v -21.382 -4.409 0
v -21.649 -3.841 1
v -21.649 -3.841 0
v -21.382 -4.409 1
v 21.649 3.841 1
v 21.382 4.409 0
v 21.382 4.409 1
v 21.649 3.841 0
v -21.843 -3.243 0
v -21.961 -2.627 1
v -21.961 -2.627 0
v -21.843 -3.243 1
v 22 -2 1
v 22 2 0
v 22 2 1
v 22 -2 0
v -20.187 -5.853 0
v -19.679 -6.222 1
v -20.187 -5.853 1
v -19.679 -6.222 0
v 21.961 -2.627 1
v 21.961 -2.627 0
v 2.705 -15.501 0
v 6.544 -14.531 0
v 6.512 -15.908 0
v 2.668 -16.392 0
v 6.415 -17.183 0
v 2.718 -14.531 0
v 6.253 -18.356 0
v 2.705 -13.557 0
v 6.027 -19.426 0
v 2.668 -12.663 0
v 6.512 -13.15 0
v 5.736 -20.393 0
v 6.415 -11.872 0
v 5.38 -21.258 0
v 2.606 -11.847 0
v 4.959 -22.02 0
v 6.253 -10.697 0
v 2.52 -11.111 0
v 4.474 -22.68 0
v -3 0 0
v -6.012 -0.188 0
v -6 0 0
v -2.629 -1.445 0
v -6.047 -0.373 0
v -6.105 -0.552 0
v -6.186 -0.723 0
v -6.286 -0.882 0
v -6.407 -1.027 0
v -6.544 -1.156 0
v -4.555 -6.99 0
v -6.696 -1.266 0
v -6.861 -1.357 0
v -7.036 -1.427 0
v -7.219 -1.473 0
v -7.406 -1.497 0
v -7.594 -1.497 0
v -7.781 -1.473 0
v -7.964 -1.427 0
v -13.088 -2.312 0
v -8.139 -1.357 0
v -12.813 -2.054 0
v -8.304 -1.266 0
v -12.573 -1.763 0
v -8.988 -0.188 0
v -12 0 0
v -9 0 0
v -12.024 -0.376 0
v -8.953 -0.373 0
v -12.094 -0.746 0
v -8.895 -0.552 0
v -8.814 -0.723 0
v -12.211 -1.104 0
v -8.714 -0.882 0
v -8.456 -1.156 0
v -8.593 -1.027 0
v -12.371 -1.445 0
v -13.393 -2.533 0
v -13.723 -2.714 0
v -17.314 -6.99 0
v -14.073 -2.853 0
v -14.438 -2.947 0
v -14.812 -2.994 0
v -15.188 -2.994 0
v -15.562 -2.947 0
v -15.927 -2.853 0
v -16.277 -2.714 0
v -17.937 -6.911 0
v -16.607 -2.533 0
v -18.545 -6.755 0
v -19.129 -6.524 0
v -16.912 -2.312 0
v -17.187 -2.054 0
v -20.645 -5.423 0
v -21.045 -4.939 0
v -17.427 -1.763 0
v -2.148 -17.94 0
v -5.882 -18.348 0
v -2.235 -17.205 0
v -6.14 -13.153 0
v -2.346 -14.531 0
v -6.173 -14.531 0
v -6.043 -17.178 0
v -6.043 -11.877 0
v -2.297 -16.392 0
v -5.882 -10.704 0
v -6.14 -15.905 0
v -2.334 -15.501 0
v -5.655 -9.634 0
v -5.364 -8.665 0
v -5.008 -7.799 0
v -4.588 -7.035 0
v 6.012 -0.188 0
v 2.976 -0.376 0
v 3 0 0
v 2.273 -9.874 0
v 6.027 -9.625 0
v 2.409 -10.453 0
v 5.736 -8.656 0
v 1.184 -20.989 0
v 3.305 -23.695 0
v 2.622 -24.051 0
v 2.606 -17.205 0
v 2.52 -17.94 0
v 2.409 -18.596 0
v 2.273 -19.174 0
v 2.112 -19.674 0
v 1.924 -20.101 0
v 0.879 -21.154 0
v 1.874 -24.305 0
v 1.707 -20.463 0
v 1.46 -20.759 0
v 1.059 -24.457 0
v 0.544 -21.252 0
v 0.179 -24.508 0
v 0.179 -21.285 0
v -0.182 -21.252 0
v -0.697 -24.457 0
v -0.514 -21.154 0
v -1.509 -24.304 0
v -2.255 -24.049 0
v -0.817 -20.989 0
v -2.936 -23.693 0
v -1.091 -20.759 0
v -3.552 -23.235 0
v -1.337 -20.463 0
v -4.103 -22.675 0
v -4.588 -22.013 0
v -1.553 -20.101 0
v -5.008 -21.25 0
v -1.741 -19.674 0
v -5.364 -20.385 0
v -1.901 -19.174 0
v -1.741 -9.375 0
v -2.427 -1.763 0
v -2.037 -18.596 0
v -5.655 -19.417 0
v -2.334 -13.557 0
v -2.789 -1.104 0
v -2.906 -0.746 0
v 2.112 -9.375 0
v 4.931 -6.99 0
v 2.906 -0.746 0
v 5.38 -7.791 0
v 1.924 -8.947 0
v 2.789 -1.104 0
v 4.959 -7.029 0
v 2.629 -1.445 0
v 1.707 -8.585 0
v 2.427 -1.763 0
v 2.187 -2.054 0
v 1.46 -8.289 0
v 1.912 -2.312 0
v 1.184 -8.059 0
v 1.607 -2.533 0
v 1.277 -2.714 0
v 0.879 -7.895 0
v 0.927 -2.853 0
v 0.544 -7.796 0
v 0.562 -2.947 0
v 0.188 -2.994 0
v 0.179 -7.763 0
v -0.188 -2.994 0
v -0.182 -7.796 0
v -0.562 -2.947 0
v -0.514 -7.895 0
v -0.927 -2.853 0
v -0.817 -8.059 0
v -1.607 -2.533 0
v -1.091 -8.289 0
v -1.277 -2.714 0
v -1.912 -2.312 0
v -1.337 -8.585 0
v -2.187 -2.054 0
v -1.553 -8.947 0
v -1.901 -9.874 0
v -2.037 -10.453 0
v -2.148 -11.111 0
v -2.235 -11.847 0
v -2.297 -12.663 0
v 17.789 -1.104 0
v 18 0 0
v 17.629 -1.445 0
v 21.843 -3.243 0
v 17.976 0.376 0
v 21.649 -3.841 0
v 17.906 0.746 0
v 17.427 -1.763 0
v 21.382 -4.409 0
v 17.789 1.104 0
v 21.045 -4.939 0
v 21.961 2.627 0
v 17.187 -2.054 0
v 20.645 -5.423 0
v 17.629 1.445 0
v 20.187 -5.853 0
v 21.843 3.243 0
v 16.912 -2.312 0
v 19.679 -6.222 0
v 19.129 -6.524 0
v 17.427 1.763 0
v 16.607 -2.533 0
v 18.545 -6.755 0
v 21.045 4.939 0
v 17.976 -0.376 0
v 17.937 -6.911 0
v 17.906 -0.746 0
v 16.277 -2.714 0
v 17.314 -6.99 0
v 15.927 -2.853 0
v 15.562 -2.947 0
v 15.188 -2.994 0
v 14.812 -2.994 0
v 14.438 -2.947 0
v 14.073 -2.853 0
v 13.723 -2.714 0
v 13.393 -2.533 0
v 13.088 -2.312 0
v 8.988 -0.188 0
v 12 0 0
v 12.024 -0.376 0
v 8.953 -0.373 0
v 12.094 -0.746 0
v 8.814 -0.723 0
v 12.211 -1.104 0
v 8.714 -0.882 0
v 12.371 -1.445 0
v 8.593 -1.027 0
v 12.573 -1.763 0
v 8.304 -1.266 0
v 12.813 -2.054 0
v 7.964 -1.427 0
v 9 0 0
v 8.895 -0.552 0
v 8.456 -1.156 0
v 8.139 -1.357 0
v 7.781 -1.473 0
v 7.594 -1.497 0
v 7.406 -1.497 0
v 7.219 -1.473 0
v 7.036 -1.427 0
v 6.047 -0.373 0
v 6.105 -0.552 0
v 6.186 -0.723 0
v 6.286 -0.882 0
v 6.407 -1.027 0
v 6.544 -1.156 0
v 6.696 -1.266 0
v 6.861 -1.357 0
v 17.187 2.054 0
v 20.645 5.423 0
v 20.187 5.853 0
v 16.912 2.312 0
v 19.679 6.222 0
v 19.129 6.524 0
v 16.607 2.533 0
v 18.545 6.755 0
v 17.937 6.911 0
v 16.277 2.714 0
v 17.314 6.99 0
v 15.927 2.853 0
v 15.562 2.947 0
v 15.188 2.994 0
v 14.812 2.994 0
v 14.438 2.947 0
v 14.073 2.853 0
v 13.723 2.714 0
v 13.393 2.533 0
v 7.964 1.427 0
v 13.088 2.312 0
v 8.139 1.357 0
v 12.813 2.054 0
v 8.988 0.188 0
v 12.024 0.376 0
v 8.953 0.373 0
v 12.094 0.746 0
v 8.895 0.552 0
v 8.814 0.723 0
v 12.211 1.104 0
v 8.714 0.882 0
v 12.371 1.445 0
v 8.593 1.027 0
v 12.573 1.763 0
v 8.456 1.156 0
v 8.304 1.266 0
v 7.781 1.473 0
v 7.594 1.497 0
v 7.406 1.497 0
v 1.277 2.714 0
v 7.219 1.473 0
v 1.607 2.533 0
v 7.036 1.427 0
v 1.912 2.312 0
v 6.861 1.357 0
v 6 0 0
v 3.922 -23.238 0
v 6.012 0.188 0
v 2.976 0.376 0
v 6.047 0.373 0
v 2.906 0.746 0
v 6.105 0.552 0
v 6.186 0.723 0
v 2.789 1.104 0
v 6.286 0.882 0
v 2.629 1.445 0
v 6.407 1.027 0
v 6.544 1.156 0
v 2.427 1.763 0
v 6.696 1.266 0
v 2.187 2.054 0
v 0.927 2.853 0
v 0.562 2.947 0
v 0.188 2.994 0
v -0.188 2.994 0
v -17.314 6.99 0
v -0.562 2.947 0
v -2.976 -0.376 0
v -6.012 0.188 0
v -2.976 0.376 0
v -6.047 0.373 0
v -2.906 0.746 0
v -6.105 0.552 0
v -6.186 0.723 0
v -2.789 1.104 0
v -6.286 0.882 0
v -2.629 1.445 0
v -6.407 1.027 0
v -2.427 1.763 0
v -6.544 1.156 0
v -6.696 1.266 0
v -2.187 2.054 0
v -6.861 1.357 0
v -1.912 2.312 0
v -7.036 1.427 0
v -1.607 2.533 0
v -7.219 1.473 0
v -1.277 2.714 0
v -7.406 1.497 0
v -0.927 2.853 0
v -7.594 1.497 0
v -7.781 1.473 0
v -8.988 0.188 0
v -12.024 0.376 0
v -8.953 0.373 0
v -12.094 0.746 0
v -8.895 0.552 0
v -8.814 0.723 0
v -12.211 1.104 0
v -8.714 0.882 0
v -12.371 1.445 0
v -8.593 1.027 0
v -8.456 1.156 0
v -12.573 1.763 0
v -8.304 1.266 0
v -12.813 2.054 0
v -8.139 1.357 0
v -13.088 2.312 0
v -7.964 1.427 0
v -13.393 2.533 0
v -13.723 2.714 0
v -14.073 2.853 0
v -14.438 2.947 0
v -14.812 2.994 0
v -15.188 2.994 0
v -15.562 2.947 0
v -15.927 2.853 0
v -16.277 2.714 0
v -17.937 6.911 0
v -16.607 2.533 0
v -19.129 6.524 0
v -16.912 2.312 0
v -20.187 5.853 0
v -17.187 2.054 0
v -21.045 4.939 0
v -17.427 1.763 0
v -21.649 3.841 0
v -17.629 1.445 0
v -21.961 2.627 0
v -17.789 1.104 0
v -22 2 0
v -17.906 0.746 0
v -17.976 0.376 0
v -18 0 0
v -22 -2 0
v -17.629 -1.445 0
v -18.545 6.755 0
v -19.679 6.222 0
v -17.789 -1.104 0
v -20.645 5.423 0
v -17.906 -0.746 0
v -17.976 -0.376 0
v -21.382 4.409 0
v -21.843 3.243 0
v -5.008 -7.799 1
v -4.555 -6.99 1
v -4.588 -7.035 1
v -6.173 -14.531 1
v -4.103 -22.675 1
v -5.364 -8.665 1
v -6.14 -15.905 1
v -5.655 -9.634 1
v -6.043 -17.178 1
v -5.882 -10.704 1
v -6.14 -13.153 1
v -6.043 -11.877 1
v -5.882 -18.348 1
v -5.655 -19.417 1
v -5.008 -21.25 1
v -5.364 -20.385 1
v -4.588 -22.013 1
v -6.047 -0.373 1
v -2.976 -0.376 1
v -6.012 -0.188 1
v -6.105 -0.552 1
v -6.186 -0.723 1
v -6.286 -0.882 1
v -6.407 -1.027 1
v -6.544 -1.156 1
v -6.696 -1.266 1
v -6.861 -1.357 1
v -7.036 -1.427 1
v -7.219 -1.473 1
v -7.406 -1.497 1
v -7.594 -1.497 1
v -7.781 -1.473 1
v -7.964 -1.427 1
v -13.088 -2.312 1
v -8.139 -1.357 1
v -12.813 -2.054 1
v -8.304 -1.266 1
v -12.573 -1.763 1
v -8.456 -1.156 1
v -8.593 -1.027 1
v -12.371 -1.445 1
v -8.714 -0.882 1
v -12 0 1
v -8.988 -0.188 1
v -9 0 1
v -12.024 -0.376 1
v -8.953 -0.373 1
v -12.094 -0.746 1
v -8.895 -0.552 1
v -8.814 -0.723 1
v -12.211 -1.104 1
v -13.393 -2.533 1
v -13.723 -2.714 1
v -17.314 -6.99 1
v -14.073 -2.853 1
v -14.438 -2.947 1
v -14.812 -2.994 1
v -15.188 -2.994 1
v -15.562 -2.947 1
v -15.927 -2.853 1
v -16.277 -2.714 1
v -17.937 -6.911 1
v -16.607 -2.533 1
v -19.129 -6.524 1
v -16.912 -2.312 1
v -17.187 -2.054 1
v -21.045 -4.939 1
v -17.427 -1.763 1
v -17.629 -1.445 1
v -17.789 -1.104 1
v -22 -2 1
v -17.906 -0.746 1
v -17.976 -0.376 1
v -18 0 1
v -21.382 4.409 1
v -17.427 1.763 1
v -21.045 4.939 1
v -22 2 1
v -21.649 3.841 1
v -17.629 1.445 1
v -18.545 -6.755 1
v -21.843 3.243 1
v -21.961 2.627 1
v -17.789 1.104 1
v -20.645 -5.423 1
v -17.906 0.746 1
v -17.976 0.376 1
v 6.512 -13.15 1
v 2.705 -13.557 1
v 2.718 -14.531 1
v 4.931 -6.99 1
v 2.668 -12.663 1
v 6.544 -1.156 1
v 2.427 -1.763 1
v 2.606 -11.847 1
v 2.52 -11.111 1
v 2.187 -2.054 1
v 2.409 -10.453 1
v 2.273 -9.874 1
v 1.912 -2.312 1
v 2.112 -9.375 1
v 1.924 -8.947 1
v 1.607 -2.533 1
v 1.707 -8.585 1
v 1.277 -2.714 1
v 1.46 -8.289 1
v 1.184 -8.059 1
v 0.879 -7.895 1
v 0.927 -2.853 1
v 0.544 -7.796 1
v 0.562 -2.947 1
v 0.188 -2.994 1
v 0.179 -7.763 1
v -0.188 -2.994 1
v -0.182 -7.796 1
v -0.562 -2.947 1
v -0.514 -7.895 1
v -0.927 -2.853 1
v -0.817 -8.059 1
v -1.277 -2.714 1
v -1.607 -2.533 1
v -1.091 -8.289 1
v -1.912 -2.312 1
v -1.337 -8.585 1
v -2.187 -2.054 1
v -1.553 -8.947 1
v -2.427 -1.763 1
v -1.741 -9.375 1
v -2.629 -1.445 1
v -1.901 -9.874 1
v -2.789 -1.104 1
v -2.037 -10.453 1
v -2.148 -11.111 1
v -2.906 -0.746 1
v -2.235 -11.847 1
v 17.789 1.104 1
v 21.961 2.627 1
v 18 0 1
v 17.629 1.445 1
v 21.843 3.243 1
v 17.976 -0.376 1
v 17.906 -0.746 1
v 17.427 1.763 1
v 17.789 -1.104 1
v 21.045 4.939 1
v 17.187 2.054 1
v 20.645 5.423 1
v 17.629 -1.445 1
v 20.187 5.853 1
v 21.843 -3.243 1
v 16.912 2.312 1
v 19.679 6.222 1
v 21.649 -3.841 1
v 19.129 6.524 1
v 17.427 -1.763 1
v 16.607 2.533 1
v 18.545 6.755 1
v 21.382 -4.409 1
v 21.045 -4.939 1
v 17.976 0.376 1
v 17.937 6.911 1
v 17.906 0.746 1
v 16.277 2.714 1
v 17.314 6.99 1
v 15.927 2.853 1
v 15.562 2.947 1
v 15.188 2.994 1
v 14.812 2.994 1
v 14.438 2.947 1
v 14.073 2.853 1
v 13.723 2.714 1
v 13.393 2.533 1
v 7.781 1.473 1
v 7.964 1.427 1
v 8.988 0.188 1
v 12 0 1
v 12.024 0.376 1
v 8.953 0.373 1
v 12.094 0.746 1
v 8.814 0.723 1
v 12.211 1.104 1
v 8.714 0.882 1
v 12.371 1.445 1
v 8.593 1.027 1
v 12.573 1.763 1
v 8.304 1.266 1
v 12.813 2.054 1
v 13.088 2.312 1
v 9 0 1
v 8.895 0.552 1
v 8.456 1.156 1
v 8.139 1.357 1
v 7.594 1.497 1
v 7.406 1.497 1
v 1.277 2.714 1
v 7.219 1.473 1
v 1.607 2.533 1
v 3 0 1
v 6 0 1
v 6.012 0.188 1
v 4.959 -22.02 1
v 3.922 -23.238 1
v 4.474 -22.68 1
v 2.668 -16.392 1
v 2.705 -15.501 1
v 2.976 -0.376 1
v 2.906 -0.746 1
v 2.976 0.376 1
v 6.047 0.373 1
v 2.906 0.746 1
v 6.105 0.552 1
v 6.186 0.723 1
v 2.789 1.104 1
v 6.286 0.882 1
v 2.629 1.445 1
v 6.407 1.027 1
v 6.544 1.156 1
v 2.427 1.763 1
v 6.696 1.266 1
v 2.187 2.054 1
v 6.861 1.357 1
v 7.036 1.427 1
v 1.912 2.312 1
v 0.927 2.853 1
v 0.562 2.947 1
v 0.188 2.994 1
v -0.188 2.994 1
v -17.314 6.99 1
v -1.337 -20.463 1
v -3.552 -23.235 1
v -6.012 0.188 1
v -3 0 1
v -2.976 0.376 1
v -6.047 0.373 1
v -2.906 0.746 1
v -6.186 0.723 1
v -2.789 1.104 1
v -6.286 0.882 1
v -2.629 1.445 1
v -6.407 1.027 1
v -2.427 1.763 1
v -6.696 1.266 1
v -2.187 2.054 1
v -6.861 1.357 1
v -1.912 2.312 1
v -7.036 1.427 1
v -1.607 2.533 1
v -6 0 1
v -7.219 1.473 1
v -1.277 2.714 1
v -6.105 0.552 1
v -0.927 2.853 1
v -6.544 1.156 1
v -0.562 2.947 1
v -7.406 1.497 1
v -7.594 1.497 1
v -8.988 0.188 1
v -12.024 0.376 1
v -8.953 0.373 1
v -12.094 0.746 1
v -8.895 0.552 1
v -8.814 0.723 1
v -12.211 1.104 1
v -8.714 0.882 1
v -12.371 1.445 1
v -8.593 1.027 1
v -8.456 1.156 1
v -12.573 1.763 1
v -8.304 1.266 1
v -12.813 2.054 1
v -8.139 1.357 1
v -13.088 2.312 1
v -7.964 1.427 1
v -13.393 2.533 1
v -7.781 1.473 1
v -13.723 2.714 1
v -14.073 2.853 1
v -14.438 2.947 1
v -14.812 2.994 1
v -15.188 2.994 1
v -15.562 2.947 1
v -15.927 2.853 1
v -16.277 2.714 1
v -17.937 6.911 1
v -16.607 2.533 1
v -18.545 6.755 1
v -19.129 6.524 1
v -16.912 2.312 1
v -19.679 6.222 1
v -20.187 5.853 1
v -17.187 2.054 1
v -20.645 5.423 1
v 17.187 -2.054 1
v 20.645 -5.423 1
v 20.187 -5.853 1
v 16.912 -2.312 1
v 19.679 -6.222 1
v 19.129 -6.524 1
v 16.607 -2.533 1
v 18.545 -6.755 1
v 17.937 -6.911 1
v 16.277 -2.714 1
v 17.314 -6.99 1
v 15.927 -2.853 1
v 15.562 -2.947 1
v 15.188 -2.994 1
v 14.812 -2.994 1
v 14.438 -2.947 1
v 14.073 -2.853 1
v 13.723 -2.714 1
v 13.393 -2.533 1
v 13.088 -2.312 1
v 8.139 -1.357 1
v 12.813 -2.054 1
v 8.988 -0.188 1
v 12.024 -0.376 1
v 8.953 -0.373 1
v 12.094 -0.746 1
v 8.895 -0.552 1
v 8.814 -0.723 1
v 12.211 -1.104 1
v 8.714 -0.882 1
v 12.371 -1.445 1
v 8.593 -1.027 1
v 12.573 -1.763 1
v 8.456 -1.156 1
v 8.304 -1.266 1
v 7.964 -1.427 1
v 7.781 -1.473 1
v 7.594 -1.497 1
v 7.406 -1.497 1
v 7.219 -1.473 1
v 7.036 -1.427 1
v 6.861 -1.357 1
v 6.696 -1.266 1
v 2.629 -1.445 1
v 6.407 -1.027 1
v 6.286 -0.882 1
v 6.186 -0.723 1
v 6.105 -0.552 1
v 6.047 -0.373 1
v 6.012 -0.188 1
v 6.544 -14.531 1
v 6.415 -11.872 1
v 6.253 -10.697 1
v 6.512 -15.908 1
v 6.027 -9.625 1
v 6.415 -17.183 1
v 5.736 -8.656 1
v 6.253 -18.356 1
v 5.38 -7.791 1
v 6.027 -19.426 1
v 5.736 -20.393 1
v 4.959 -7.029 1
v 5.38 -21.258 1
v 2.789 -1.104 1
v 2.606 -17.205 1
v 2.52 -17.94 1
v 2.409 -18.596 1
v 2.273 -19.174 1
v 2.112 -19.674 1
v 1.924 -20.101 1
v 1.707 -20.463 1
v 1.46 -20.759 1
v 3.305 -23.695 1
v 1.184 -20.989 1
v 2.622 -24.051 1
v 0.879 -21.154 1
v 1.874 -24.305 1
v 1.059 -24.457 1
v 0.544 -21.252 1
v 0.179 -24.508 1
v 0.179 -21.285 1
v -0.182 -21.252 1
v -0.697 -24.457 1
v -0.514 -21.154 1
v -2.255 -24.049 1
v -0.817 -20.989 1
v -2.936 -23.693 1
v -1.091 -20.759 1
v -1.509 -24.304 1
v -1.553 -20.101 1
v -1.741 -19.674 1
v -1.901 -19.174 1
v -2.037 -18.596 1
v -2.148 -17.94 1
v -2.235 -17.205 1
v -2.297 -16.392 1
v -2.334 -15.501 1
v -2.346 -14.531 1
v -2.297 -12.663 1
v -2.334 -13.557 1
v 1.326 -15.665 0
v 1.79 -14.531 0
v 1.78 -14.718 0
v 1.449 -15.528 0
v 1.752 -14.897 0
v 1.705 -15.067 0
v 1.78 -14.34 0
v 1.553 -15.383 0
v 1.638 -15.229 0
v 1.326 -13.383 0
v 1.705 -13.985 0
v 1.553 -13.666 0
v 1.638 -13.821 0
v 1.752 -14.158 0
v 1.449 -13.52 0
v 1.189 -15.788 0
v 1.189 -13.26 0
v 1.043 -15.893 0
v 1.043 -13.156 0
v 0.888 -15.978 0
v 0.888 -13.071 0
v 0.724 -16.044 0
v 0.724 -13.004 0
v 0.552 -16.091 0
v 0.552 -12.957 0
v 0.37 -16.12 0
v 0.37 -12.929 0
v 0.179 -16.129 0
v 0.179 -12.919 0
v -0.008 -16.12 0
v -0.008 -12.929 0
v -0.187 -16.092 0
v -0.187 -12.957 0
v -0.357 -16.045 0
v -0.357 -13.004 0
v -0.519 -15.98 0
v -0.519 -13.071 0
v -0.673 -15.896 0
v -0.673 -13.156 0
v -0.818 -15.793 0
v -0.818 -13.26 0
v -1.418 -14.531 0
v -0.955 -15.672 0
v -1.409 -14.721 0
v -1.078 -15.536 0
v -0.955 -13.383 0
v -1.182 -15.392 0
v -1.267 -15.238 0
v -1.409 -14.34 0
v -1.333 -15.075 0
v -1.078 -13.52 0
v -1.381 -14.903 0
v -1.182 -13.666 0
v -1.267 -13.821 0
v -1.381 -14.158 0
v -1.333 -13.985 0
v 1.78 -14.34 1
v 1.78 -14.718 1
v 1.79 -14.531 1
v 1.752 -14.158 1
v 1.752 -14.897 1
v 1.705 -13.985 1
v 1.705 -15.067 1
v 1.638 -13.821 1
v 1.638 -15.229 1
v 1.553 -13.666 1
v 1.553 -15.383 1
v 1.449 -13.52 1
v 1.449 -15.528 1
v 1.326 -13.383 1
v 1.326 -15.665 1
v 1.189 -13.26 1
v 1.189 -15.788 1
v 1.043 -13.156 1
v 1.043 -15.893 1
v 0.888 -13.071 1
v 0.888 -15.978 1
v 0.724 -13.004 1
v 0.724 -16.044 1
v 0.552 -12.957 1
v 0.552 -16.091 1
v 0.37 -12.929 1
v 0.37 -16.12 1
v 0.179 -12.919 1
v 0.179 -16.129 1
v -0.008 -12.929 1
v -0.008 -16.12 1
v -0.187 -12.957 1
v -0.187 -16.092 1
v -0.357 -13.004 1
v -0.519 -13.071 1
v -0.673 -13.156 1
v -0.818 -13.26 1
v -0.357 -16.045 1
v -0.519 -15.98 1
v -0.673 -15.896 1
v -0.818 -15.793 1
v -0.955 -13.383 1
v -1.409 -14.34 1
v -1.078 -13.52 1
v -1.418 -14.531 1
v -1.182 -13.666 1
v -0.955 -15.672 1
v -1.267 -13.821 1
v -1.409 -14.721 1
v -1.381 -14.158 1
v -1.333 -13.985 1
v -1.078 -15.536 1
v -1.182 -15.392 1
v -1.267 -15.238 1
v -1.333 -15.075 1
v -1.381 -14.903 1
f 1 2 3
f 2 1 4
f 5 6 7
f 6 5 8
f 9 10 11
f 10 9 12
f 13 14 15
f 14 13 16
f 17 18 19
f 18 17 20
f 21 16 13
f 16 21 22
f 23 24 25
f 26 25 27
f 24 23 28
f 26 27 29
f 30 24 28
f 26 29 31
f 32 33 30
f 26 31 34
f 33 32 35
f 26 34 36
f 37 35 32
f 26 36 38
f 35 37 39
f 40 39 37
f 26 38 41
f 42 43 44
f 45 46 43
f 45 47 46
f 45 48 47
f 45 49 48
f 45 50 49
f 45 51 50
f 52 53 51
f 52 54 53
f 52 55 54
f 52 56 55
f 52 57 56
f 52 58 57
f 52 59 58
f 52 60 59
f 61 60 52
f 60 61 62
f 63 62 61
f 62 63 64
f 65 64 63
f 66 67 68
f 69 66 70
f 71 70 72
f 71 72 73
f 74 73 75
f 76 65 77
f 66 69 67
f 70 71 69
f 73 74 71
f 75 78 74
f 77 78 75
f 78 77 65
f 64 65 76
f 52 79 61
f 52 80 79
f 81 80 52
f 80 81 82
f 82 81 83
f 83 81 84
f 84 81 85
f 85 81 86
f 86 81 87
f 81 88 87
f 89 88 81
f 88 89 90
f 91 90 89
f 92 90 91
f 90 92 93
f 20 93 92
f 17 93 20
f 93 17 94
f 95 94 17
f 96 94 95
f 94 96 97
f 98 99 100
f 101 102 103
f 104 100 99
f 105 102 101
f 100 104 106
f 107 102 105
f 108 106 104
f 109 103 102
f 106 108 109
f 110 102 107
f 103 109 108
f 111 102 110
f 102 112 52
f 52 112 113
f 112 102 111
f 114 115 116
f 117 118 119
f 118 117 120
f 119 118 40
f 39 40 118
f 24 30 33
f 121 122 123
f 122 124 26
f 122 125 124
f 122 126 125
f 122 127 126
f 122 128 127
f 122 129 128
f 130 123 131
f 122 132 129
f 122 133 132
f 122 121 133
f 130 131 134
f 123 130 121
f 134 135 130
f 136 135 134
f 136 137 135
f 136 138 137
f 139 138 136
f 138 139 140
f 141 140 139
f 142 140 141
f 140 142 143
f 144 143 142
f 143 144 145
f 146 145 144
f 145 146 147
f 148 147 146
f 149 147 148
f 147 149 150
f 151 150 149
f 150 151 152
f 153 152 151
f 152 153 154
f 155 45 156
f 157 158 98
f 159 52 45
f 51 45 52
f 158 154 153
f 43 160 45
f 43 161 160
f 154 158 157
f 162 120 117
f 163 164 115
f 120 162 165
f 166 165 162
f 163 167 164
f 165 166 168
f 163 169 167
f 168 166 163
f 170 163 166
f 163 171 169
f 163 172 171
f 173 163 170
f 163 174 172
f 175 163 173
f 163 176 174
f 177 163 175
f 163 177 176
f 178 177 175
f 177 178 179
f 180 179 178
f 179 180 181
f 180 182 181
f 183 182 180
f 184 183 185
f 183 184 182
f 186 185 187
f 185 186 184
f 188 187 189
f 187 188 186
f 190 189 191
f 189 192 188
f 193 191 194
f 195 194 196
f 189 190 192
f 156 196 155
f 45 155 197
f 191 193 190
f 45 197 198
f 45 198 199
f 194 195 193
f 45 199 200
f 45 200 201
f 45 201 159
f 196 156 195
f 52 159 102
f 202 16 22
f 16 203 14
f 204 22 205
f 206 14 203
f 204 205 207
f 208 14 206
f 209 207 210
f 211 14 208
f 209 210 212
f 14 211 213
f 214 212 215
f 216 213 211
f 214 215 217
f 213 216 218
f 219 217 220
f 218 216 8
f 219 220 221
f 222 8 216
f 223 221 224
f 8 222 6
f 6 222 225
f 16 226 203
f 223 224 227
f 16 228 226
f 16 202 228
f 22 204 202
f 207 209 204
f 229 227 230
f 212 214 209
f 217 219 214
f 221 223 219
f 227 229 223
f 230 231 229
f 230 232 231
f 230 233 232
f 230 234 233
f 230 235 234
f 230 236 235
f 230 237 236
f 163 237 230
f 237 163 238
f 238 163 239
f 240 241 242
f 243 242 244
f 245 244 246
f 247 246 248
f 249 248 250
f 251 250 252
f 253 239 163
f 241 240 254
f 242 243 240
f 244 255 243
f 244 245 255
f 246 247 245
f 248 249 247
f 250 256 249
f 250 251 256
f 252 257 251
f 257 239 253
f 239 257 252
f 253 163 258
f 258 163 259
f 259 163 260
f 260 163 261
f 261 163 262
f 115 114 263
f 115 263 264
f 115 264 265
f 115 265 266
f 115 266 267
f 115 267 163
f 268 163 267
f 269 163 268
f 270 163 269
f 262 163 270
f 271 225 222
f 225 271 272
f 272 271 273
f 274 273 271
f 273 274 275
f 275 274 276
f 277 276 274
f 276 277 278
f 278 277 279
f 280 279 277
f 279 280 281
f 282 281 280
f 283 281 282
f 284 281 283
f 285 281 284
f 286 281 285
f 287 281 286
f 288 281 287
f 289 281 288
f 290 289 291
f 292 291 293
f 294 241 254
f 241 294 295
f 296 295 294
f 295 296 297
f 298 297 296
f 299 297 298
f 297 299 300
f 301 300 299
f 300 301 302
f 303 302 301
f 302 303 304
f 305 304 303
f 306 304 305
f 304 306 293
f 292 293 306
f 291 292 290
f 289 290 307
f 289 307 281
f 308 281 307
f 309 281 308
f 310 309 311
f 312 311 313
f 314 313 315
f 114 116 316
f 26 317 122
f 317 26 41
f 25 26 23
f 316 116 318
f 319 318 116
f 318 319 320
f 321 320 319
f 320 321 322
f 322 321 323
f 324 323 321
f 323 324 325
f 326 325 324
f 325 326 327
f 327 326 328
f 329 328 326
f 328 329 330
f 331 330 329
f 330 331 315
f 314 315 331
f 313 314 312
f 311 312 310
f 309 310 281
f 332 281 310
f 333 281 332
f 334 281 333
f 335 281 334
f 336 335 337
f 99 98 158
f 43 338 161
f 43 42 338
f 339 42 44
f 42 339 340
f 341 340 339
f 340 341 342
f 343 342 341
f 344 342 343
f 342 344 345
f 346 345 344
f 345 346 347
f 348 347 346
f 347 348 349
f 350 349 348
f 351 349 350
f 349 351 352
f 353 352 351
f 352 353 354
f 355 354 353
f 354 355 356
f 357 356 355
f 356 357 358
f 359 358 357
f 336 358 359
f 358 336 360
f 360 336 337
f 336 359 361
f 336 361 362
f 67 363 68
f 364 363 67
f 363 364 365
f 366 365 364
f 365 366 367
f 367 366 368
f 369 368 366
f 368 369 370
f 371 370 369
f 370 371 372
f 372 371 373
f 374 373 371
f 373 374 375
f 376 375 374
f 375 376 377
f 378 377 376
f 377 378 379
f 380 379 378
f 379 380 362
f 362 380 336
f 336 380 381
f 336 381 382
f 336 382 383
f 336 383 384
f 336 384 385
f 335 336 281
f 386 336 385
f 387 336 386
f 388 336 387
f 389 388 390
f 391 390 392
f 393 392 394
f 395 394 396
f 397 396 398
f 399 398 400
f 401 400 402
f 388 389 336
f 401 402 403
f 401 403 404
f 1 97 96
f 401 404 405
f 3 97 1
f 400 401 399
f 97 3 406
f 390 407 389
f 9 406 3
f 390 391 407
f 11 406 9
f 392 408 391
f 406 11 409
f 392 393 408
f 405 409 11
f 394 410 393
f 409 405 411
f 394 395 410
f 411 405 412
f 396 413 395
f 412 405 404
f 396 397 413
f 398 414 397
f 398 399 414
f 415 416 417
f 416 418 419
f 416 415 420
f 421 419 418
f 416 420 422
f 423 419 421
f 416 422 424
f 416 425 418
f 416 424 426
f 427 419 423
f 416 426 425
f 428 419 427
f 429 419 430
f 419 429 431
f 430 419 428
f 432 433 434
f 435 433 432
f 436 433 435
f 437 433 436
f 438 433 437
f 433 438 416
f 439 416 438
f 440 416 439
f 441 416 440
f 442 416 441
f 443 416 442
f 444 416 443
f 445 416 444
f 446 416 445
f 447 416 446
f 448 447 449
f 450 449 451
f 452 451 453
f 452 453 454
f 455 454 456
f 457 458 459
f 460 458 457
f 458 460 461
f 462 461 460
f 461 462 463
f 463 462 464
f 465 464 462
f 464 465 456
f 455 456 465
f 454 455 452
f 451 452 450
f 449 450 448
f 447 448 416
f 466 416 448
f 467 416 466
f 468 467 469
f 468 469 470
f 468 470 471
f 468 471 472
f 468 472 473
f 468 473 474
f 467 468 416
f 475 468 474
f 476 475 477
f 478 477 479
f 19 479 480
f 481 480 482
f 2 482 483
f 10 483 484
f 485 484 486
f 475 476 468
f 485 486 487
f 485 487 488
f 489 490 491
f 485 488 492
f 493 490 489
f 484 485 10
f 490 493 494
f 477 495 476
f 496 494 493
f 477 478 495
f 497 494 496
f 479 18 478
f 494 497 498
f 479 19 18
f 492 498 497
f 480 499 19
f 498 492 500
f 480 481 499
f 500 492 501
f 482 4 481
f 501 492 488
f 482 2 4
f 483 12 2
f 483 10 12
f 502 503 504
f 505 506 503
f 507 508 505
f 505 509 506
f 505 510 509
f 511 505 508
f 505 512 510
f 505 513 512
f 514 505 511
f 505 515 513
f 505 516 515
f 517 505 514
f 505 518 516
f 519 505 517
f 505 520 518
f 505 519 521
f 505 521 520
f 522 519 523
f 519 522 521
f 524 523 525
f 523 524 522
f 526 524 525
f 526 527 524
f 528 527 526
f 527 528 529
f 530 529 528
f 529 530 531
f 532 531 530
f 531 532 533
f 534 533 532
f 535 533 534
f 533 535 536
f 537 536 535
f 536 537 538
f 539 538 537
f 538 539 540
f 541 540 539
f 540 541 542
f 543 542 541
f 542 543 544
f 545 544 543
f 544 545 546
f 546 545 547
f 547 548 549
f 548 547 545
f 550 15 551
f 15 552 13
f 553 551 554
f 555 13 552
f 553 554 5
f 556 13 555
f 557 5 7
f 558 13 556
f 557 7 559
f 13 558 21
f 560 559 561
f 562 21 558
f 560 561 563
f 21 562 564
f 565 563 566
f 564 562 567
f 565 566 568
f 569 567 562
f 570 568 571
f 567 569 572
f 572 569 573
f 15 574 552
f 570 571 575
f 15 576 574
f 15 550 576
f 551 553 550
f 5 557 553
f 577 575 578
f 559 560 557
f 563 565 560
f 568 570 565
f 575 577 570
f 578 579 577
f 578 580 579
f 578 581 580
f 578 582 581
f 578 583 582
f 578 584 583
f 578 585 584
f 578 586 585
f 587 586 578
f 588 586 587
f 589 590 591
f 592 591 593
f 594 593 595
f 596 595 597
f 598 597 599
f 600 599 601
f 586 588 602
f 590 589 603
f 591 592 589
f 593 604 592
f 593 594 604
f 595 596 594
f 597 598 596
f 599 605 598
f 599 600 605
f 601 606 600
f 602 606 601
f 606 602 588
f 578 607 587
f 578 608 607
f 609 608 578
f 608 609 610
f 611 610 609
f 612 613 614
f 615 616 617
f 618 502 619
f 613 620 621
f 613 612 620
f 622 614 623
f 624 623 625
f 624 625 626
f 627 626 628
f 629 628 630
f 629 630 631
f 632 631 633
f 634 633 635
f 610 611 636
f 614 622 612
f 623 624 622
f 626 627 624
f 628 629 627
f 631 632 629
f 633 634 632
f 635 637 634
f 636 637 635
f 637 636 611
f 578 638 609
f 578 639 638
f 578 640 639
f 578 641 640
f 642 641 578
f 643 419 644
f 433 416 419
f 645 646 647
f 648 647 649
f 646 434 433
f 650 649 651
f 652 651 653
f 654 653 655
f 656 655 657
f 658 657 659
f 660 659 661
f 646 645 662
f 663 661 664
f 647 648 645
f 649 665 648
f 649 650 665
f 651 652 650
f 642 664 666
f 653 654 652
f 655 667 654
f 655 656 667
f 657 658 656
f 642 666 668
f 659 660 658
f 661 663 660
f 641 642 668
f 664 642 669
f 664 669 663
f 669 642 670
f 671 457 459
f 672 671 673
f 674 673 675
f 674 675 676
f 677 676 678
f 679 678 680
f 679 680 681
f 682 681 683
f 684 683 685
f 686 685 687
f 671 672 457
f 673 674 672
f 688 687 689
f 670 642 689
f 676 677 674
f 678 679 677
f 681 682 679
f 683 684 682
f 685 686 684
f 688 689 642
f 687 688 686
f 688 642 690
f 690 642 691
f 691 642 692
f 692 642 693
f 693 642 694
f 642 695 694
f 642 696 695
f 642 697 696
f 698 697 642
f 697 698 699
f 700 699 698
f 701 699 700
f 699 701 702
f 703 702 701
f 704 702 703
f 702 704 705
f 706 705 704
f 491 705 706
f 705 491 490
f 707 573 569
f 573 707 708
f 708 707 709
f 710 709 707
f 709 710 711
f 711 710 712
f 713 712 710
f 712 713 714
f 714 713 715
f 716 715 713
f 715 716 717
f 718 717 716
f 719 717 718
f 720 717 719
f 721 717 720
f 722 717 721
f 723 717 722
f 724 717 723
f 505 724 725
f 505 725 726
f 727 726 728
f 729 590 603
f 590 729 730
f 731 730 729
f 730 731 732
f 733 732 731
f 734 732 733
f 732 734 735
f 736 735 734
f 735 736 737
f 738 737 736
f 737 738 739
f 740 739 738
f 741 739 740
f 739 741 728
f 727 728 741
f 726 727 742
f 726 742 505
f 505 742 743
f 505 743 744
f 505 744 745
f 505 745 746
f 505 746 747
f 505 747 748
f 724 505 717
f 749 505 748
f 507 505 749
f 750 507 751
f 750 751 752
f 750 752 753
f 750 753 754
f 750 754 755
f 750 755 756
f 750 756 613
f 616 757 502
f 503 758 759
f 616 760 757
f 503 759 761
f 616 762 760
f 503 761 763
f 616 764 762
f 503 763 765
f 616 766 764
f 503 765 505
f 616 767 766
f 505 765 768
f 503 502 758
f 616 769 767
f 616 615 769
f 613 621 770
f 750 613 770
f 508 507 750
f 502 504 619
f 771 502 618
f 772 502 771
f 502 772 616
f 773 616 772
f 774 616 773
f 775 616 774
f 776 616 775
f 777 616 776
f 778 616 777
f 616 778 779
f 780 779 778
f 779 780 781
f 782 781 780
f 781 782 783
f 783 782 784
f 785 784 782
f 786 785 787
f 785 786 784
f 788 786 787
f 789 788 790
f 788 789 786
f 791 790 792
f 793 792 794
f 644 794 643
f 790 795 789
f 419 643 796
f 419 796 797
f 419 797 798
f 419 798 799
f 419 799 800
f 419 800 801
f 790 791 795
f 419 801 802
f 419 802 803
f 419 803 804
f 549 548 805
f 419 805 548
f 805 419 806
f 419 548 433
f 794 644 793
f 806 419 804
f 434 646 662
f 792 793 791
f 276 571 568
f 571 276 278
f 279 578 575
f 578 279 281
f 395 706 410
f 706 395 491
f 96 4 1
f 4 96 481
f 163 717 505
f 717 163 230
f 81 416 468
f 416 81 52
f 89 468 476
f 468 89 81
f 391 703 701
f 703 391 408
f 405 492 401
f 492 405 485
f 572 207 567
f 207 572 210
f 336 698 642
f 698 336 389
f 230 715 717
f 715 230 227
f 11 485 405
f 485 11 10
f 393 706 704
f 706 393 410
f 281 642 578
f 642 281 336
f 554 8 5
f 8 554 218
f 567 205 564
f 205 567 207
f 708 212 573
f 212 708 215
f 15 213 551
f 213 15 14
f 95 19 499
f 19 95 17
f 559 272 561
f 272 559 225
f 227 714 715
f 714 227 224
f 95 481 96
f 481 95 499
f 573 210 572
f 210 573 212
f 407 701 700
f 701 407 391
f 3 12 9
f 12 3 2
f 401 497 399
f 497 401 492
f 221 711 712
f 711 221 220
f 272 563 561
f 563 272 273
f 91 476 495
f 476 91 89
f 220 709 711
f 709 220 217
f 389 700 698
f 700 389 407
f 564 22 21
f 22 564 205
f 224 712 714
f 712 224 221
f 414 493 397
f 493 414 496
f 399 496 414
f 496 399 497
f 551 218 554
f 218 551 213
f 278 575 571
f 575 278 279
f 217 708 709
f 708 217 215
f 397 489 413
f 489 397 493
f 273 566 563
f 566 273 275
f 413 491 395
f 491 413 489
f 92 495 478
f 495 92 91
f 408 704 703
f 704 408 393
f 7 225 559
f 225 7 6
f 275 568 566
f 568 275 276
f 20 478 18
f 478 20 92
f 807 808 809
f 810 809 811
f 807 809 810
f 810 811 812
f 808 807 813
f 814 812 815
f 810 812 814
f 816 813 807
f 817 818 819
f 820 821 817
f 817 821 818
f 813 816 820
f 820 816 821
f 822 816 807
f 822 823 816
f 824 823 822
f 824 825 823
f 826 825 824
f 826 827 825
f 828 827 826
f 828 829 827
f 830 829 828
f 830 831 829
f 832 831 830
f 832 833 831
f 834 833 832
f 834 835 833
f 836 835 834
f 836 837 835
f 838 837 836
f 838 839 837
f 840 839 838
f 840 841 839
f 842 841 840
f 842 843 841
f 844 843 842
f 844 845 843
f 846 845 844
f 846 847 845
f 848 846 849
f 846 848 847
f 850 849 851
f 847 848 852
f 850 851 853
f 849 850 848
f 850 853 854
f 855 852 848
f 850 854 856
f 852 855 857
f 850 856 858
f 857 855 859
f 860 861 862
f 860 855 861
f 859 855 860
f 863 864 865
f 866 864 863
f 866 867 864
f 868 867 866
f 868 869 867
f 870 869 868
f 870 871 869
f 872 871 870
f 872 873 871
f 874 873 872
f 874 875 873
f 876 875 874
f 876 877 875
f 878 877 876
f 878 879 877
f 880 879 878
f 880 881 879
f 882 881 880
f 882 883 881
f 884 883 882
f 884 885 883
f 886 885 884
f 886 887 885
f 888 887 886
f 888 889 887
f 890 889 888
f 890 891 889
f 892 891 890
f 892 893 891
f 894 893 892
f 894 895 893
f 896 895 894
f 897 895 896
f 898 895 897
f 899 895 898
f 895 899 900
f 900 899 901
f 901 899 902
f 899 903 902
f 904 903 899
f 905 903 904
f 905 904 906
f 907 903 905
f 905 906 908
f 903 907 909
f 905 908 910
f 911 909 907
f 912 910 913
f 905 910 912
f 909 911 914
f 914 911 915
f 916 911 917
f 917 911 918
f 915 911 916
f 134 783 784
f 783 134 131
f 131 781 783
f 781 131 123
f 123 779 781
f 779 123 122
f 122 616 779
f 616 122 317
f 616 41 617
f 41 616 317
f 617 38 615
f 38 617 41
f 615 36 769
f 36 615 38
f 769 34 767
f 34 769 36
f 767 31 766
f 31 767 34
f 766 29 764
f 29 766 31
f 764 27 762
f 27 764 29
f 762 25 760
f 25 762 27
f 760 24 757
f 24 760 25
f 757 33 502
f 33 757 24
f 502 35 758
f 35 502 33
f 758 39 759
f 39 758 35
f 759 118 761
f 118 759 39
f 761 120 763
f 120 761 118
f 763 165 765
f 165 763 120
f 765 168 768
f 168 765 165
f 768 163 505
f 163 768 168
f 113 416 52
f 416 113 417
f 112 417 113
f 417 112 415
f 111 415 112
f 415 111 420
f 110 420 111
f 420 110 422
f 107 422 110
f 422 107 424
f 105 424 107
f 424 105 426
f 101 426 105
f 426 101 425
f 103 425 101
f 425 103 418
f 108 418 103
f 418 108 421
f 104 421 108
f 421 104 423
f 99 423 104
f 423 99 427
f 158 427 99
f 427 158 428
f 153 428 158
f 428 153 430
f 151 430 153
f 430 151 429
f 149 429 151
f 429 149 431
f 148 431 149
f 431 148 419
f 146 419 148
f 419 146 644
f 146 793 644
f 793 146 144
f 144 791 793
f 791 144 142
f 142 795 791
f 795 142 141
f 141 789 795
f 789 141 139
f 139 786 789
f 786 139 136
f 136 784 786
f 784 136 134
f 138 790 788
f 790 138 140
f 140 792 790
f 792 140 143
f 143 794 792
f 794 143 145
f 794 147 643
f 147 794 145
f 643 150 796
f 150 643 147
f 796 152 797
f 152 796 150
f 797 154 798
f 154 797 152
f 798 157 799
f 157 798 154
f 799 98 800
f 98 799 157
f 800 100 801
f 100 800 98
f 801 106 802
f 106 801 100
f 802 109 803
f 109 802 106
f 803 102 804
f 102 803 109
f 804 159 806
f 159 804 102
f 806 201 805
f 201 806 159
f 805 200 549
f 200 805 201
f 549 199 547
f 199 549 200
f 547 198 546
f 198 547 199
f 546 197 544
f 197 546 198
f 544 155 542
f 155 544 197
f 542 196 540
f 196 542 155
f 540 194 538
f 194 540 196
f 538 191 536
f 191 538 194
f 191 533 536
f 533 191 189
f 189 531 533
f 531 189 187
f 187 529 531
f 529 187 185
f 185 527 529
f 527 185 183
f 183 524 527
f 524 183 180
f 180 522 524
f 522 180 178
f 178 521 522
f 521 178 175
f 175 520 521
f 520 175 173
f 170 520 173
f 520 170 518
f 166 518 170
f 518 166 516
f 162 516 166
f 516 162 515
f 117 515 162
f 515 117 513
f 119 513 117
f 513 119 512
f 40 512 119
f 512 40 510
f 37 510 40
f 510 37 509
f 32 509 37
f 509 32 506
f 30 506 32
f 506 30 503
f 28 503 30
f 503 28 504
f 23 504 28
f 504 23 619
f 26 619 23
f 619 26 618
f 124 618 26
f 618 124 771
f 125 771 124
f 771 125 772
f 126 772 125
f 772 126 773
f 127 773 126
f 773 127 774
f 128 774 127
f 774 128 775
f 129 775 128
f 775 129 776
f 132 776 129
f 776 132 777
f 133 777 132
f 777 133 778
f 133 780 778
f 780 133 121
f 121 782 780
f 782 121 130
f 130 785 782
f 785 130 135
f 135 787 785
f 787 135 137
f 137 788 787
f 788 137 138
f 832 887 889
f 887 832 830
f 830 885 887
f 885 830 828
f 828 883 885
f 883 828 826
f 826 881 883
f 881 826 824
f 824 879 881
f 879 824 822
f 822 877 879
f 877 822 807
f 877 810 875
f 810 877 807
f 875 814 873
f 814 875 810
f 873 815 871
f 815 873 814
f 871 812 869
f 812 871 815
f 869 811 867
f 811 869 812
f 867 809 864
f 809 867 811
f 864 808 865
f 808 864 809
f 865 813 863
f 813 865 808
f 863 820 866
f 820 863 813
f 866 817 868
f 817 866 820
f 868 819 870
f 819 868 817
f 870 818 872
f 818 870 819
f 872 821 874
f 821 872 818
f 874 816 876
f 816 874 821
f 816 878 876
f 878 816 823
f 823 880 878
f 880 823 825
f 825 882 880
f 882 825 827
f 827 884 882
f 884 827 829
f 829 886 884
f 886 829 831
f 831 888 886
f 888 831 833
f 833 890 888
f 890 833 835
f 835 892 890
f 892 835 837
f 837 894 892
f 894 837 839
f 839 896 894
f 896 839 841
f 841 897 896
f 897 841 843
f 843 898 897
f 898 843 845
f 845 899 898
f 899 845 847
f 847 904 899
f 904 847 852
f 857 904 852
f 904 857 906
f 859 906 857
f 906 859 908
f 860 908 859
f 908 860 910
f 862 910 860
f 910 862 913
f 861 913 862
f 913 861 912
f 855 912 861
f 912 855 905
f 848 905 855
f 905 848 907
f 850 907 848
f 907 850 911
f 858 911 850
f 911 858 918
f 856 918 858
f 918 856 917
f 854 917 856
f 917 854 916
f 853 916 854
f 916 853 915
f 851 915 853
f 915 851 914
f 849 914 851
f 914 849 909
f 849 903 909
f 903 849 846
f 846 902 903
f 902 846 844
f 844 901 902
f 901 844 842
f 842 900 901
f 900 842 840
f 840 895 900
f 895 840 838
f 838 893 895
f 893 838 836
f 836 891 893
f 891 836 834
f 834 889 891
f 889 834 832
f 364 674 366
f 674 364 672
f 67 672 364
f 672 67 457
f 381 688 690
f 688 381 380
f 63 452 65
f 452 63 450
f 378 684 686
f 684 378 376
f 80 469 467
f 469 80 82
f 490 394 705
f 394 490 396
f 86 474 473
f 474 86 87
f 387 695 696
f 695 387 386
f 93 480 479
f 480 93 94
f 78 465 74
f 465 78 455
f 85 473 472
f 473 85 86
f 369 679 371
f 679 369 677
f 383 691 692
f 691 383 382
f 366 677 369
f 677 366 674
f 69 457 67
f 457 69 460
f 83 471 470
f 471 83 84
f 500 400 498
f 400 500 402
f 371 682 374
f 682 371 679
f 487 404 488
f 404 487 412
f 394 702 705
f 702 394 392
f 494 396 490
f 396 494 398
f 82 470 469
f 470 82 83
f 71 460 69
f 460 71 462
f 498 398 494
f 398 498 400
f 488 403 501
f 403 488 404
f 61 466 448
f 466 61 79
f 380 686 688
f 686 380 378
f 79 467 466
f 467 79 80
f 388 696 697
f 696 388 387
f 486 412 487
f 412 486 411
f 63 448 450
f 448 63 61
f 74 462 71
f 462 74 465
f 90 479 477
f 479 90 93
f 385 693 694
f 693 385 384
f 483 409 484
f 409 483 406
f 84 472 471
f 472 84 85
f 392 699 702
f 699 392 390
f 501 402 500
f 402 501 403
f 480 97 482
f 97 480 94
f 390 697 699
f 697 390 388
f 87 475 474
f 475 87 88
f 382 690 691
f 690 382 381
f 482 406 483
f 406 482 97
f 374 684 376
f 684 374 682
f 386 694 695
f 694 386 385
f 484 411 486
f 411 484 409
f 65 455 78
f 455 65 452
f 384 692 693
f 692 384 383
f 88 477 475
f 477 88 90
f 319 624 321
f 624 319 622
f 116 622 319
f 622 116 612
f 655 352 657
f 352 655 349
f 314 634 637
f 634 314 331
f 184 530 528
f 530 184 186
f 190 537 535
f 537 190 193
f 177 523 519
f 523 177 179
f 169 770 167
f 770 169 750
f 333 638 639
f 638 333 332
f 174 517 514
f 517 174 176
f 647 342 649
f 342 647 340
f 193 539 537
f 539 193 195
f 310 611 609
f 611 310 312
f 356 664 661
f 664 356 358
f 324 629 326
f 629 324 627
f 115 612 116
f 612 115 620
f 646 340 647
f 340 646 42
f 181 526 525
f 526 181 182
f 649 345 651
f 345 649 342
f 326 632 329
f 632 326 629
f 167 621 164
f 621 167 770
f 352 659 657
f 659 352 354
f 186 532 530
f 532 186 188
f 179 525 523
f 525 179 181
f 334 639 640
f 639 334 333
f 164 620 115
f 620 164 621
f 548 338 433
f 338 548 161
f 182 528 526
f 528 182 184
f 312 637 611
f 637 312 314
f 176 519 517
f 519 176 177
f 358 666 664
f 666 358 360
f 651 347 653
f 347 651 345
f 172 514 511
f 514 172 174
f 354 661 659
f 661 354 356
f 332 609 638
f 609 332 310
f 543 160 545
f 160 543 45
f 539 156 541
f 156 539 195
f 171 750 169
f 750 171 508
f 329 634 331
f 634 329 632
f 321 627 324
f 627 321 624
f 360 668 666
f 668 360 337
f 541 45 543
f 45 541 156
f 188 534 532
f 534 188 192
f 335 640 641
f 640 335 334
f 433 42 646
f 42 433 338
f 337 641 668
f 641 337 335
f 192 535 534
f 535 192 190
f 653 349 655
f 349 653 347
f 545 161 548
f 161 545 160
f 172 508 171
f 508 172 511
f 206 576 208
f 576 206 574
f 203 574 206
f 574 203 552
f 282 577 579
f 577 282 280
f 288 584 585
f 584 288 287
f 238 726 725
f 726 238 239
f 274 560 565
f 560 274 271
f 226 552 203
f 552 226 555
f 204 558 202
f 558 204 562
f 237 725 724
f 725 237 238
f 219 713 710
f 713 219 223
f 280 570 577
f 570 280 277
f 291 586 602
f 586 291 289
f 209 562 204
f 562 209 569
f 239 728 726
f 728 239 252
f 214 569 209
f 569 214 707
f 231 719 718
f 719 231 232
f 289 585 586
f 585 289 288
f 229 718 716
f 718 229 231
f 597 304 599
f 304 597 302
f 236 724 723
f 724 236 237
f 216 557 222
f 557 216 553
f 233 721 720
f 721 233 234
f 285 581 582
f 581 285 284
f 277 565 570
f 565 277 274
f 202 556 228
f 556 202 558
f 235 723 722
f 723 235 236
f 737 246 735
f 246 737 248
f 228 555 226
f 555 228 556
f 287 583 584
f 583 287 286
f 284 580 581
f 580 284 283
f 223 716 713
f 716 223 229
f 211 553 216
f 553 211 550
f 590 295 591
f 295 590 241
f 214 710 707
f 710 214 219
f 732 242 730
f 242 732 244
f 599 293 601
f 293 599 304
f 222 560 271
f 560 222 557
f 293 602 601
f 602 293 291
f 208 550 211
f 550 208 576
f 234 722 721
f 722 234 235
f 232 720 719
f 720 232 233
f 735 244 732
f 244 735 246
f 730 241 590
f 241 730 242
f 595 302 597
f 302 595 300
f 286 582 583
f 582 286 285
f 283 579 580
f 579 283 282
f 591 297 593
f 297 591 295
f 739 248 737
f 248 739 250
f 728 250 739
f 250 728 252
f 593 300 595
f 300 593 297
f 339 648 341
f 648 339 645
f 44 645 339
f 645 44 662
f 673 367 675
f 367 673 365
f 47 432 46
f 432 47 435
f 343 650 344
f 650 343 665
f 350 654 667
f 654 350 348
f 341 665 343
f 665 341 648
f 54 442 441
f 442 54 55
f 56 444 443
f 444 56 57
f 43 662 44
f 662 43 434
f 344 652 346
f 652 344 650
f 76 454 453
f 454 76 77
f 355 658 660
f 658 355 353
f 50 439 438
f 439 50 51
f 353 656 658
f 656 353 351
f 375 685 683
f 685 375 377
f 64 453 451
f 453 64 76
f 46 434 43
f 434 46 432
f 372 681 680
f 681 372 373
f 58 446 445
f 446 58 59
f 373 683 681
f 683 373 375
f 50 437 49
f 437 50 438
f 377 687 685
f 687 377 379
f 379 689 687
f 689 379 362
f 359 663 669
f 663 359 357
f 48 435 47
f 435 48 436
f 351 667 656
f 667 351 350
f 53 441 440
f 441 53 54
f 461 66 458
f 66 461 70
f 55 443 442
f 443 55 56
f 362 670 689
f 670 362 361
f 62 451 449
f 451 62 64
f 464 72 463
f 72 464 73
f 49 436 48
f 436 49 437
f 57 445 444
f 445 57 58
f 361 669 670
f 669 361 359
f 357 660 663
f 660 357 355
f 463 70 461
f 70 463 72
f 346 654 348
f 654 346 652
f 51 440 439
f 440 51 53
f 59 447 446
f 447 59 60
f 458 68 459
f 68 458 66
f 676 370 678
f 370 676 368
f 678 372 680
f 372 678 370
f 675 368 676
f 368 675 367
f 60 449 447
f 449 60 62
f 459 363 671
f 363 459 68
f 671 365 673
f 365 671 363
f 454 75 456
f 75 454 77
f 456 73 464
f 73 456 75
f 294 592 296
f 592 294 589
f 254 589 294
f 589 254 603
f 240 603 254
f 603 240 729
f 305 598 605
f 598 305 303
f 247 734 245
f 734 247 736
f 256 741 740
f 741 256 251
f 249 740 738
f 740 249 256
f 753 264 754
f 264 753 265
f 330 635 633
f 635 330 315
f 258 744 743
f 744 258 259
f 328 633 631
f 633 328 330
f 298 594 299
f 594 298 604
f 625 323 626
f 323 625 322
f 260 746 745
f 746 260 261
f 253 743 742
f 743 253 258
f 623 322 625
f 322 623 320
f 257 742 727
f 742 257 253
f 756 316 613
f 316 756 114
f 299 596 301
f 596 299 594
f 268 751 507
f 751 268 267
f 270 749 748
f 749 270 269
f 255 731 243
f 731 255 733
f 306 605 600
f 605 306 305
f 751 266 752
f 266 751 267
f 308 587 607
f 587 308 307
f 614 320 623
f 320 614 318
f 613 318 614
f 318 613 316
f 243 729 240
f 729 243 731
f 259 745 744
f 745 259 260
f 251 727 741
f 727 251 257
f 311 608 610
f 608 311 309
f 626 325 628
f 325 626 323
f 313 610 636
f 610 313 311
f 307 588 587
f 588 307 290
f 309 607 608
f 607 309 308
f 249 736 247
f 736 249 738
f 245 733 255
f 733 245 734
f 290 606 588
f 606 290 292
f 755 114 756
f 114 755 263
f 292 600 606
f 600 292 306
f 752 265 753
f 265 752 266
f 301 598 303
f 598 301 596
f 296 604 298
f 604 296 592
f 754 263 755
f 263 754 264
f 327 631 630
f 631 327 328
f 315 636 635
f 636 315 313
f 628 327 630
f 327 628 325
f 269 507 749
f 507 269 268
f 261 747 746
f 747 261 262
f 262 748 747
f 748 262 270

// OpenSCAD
$fn = 50;


difference() {
	union() {
		hull() {
			translate(v = [-17.0000000000, 2.0000000000, 0]) {
				cylinder(h = 1, r = 5);
			}
			translate(v = [17.0000000000, 2.0000000000, 0]) {
				cylinder(h = 1, r = 5);
			}
			translate(v = [-17.0000000000, -2.0000000000, 0]) {
				cylinder(h = 1, r = 5);
			}
			translate(v = [17.0000000000, -2.0000000000, 0]) {
				cylinder(h = 1, r = 5);
			}
		}
		translate(v = [0, -5, 0]) {
			linear_extrude(height = 1) {
				text(font = "DejaVu Sans Mono:style=Bold", halign = "center", size = 19.0000000000, text = "0", valign = "top");
			}
		}
	}
	union() {
		translate(v = [-15.0000000000, 0.0000000000, 0]) {
			translate(v = [0, 0, -100]) {
				cylinder(h = 200, r = 3.0000000000);
			}
		}
		translate(v = [0, 0, -100]) {
			cylinder(h = 200, r = 3.0000000000);
		}
		translate(v = [15.0000000000, 0.0000000000, 0]) {
			translate(v = [0, 0, -100]) {
				cylinder(h = 200, r = 3.0000000000);
			}
		}
		translate(v = [-15.0000000000, 0.0000000000, 0]) {
			translate(v = [0, 0, -100]) {
				cylinder(h = 200, r = 1.5000000000);
			}
		}
		translate(v = [-7.5000000000, 0.0000000000, 0]) {
			translate(v = [0, 0, -100]) {
				cylinder(h = 200, r = 1.5000000000);
			}
		}
		translate(v = [0, 0, -100]) {
			cylinder(h = 200, r = 1.5000000000);
		}
		translate(v = [7.5000000000, 0.0000000000, 0]) {
			translate(v = [0, 0, -100]) {
				cylinder(h = 200, r = 1.5000000000);
			}
		}
		translate(v = [15.0000000000, 0.0000000000, 0]) {
			translate(v = [0, 0, -100]) {
				cylinder(h = 200, r = 1.5000000000);
			}
		}
	}
}
